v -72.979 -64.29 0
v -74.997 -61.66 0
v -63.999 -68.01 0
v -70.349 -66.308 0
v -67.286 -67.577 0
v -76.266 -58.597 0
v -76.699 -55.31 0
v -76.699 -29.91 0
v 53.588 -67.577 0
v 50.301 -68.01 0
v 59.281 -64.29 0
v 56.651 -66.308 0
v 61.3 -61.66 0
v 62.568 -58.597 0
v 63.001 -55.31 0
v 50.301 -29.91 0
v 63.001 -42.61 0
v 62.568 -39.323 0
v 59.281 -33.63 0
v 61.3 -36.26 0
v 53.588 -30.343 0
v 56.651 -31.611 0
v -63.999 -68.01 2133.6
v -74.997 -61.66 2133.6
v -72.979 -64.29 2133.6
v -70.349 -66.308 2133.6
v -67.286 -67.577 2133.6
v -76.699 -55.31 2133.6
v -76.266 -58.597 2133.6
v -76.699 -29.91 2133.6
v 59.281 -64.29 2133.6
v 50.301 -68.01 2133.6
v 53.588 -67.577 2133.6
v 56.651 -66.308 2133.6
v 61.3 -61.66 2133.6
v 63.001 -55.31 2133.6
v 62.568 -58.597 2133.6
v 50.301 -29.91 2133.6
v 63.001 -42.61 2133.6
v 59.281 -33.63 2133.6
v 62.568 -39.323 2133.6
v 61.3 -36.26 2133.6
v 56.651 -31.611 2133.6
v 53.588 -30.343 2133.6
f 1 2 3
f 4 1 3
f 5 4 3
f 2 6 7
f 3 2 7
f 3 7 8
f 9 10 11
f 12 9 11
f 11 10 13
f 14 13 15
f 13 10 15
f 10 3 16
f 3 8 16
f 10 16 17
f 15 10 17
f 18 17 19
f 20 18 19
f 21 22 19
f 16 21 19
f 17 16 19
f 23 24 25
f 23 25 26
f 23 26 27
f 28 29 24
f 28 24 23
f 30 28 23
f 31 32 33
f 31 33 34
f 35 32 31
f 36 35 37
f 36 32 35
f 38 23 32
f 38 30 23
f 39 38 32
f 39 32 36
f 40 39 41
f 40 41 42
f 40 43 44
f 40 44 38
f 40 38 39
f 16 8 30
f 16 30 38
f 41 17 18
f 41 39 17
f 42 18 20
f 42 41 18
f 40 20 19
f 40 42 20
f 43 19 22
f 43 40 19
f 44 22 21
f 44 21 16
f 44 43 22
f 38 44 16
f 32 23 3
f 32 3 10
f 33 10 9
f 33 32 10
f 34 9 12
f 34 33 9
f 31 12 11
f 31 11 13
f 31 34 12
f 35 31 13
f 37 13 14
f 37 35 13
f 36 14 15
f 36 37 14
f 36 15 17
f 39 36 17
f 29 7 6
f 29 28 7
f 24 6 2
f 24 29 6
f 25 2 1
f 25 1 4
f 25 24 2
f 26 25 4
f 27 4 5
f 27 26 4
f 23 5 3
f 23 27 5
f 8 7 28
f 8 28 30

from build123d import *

# Parameters (mm, degrees)
F0_W     = 139.7
F0_H     = 38.1
F1_DEPTH = 2133.6
F2_R     = 12.7
F3_R     = 12.7
F4_R     = 12.7


with BuildPart() as f1:
    # F0 (on Top) → F1 (new body)
    with BuildSketch(Plane.XY):
        with Locations((-6.848779, -48.959874)):
            Rectangle(F0_W, F0_H)
    extrude(amount=F1_DEPTH)

    # F2
    f2_edges = [f1.edges().sort_by_distance(p)[0] for p in [
        (-76.698779, -68.009874, 1066.8),
    ]]
    fillet(f2_edges, radius=F2_R)

    # F3
    f3_edges = [f1.edges().sort_by_distance(p)[0] for p in [
        (63.001221, -68.009874, 1066.8),
    ]]
    fillet(f3_edges, radius=F3_R)

    # F4
    f4_edges = [f1.edges().sort_by_distance(p)[0] for p in [
        (63.001221, -29.909874, 1066.8),
    ]]
    fillet(f4_edges, radius=F4_R)


solid = f1.part
